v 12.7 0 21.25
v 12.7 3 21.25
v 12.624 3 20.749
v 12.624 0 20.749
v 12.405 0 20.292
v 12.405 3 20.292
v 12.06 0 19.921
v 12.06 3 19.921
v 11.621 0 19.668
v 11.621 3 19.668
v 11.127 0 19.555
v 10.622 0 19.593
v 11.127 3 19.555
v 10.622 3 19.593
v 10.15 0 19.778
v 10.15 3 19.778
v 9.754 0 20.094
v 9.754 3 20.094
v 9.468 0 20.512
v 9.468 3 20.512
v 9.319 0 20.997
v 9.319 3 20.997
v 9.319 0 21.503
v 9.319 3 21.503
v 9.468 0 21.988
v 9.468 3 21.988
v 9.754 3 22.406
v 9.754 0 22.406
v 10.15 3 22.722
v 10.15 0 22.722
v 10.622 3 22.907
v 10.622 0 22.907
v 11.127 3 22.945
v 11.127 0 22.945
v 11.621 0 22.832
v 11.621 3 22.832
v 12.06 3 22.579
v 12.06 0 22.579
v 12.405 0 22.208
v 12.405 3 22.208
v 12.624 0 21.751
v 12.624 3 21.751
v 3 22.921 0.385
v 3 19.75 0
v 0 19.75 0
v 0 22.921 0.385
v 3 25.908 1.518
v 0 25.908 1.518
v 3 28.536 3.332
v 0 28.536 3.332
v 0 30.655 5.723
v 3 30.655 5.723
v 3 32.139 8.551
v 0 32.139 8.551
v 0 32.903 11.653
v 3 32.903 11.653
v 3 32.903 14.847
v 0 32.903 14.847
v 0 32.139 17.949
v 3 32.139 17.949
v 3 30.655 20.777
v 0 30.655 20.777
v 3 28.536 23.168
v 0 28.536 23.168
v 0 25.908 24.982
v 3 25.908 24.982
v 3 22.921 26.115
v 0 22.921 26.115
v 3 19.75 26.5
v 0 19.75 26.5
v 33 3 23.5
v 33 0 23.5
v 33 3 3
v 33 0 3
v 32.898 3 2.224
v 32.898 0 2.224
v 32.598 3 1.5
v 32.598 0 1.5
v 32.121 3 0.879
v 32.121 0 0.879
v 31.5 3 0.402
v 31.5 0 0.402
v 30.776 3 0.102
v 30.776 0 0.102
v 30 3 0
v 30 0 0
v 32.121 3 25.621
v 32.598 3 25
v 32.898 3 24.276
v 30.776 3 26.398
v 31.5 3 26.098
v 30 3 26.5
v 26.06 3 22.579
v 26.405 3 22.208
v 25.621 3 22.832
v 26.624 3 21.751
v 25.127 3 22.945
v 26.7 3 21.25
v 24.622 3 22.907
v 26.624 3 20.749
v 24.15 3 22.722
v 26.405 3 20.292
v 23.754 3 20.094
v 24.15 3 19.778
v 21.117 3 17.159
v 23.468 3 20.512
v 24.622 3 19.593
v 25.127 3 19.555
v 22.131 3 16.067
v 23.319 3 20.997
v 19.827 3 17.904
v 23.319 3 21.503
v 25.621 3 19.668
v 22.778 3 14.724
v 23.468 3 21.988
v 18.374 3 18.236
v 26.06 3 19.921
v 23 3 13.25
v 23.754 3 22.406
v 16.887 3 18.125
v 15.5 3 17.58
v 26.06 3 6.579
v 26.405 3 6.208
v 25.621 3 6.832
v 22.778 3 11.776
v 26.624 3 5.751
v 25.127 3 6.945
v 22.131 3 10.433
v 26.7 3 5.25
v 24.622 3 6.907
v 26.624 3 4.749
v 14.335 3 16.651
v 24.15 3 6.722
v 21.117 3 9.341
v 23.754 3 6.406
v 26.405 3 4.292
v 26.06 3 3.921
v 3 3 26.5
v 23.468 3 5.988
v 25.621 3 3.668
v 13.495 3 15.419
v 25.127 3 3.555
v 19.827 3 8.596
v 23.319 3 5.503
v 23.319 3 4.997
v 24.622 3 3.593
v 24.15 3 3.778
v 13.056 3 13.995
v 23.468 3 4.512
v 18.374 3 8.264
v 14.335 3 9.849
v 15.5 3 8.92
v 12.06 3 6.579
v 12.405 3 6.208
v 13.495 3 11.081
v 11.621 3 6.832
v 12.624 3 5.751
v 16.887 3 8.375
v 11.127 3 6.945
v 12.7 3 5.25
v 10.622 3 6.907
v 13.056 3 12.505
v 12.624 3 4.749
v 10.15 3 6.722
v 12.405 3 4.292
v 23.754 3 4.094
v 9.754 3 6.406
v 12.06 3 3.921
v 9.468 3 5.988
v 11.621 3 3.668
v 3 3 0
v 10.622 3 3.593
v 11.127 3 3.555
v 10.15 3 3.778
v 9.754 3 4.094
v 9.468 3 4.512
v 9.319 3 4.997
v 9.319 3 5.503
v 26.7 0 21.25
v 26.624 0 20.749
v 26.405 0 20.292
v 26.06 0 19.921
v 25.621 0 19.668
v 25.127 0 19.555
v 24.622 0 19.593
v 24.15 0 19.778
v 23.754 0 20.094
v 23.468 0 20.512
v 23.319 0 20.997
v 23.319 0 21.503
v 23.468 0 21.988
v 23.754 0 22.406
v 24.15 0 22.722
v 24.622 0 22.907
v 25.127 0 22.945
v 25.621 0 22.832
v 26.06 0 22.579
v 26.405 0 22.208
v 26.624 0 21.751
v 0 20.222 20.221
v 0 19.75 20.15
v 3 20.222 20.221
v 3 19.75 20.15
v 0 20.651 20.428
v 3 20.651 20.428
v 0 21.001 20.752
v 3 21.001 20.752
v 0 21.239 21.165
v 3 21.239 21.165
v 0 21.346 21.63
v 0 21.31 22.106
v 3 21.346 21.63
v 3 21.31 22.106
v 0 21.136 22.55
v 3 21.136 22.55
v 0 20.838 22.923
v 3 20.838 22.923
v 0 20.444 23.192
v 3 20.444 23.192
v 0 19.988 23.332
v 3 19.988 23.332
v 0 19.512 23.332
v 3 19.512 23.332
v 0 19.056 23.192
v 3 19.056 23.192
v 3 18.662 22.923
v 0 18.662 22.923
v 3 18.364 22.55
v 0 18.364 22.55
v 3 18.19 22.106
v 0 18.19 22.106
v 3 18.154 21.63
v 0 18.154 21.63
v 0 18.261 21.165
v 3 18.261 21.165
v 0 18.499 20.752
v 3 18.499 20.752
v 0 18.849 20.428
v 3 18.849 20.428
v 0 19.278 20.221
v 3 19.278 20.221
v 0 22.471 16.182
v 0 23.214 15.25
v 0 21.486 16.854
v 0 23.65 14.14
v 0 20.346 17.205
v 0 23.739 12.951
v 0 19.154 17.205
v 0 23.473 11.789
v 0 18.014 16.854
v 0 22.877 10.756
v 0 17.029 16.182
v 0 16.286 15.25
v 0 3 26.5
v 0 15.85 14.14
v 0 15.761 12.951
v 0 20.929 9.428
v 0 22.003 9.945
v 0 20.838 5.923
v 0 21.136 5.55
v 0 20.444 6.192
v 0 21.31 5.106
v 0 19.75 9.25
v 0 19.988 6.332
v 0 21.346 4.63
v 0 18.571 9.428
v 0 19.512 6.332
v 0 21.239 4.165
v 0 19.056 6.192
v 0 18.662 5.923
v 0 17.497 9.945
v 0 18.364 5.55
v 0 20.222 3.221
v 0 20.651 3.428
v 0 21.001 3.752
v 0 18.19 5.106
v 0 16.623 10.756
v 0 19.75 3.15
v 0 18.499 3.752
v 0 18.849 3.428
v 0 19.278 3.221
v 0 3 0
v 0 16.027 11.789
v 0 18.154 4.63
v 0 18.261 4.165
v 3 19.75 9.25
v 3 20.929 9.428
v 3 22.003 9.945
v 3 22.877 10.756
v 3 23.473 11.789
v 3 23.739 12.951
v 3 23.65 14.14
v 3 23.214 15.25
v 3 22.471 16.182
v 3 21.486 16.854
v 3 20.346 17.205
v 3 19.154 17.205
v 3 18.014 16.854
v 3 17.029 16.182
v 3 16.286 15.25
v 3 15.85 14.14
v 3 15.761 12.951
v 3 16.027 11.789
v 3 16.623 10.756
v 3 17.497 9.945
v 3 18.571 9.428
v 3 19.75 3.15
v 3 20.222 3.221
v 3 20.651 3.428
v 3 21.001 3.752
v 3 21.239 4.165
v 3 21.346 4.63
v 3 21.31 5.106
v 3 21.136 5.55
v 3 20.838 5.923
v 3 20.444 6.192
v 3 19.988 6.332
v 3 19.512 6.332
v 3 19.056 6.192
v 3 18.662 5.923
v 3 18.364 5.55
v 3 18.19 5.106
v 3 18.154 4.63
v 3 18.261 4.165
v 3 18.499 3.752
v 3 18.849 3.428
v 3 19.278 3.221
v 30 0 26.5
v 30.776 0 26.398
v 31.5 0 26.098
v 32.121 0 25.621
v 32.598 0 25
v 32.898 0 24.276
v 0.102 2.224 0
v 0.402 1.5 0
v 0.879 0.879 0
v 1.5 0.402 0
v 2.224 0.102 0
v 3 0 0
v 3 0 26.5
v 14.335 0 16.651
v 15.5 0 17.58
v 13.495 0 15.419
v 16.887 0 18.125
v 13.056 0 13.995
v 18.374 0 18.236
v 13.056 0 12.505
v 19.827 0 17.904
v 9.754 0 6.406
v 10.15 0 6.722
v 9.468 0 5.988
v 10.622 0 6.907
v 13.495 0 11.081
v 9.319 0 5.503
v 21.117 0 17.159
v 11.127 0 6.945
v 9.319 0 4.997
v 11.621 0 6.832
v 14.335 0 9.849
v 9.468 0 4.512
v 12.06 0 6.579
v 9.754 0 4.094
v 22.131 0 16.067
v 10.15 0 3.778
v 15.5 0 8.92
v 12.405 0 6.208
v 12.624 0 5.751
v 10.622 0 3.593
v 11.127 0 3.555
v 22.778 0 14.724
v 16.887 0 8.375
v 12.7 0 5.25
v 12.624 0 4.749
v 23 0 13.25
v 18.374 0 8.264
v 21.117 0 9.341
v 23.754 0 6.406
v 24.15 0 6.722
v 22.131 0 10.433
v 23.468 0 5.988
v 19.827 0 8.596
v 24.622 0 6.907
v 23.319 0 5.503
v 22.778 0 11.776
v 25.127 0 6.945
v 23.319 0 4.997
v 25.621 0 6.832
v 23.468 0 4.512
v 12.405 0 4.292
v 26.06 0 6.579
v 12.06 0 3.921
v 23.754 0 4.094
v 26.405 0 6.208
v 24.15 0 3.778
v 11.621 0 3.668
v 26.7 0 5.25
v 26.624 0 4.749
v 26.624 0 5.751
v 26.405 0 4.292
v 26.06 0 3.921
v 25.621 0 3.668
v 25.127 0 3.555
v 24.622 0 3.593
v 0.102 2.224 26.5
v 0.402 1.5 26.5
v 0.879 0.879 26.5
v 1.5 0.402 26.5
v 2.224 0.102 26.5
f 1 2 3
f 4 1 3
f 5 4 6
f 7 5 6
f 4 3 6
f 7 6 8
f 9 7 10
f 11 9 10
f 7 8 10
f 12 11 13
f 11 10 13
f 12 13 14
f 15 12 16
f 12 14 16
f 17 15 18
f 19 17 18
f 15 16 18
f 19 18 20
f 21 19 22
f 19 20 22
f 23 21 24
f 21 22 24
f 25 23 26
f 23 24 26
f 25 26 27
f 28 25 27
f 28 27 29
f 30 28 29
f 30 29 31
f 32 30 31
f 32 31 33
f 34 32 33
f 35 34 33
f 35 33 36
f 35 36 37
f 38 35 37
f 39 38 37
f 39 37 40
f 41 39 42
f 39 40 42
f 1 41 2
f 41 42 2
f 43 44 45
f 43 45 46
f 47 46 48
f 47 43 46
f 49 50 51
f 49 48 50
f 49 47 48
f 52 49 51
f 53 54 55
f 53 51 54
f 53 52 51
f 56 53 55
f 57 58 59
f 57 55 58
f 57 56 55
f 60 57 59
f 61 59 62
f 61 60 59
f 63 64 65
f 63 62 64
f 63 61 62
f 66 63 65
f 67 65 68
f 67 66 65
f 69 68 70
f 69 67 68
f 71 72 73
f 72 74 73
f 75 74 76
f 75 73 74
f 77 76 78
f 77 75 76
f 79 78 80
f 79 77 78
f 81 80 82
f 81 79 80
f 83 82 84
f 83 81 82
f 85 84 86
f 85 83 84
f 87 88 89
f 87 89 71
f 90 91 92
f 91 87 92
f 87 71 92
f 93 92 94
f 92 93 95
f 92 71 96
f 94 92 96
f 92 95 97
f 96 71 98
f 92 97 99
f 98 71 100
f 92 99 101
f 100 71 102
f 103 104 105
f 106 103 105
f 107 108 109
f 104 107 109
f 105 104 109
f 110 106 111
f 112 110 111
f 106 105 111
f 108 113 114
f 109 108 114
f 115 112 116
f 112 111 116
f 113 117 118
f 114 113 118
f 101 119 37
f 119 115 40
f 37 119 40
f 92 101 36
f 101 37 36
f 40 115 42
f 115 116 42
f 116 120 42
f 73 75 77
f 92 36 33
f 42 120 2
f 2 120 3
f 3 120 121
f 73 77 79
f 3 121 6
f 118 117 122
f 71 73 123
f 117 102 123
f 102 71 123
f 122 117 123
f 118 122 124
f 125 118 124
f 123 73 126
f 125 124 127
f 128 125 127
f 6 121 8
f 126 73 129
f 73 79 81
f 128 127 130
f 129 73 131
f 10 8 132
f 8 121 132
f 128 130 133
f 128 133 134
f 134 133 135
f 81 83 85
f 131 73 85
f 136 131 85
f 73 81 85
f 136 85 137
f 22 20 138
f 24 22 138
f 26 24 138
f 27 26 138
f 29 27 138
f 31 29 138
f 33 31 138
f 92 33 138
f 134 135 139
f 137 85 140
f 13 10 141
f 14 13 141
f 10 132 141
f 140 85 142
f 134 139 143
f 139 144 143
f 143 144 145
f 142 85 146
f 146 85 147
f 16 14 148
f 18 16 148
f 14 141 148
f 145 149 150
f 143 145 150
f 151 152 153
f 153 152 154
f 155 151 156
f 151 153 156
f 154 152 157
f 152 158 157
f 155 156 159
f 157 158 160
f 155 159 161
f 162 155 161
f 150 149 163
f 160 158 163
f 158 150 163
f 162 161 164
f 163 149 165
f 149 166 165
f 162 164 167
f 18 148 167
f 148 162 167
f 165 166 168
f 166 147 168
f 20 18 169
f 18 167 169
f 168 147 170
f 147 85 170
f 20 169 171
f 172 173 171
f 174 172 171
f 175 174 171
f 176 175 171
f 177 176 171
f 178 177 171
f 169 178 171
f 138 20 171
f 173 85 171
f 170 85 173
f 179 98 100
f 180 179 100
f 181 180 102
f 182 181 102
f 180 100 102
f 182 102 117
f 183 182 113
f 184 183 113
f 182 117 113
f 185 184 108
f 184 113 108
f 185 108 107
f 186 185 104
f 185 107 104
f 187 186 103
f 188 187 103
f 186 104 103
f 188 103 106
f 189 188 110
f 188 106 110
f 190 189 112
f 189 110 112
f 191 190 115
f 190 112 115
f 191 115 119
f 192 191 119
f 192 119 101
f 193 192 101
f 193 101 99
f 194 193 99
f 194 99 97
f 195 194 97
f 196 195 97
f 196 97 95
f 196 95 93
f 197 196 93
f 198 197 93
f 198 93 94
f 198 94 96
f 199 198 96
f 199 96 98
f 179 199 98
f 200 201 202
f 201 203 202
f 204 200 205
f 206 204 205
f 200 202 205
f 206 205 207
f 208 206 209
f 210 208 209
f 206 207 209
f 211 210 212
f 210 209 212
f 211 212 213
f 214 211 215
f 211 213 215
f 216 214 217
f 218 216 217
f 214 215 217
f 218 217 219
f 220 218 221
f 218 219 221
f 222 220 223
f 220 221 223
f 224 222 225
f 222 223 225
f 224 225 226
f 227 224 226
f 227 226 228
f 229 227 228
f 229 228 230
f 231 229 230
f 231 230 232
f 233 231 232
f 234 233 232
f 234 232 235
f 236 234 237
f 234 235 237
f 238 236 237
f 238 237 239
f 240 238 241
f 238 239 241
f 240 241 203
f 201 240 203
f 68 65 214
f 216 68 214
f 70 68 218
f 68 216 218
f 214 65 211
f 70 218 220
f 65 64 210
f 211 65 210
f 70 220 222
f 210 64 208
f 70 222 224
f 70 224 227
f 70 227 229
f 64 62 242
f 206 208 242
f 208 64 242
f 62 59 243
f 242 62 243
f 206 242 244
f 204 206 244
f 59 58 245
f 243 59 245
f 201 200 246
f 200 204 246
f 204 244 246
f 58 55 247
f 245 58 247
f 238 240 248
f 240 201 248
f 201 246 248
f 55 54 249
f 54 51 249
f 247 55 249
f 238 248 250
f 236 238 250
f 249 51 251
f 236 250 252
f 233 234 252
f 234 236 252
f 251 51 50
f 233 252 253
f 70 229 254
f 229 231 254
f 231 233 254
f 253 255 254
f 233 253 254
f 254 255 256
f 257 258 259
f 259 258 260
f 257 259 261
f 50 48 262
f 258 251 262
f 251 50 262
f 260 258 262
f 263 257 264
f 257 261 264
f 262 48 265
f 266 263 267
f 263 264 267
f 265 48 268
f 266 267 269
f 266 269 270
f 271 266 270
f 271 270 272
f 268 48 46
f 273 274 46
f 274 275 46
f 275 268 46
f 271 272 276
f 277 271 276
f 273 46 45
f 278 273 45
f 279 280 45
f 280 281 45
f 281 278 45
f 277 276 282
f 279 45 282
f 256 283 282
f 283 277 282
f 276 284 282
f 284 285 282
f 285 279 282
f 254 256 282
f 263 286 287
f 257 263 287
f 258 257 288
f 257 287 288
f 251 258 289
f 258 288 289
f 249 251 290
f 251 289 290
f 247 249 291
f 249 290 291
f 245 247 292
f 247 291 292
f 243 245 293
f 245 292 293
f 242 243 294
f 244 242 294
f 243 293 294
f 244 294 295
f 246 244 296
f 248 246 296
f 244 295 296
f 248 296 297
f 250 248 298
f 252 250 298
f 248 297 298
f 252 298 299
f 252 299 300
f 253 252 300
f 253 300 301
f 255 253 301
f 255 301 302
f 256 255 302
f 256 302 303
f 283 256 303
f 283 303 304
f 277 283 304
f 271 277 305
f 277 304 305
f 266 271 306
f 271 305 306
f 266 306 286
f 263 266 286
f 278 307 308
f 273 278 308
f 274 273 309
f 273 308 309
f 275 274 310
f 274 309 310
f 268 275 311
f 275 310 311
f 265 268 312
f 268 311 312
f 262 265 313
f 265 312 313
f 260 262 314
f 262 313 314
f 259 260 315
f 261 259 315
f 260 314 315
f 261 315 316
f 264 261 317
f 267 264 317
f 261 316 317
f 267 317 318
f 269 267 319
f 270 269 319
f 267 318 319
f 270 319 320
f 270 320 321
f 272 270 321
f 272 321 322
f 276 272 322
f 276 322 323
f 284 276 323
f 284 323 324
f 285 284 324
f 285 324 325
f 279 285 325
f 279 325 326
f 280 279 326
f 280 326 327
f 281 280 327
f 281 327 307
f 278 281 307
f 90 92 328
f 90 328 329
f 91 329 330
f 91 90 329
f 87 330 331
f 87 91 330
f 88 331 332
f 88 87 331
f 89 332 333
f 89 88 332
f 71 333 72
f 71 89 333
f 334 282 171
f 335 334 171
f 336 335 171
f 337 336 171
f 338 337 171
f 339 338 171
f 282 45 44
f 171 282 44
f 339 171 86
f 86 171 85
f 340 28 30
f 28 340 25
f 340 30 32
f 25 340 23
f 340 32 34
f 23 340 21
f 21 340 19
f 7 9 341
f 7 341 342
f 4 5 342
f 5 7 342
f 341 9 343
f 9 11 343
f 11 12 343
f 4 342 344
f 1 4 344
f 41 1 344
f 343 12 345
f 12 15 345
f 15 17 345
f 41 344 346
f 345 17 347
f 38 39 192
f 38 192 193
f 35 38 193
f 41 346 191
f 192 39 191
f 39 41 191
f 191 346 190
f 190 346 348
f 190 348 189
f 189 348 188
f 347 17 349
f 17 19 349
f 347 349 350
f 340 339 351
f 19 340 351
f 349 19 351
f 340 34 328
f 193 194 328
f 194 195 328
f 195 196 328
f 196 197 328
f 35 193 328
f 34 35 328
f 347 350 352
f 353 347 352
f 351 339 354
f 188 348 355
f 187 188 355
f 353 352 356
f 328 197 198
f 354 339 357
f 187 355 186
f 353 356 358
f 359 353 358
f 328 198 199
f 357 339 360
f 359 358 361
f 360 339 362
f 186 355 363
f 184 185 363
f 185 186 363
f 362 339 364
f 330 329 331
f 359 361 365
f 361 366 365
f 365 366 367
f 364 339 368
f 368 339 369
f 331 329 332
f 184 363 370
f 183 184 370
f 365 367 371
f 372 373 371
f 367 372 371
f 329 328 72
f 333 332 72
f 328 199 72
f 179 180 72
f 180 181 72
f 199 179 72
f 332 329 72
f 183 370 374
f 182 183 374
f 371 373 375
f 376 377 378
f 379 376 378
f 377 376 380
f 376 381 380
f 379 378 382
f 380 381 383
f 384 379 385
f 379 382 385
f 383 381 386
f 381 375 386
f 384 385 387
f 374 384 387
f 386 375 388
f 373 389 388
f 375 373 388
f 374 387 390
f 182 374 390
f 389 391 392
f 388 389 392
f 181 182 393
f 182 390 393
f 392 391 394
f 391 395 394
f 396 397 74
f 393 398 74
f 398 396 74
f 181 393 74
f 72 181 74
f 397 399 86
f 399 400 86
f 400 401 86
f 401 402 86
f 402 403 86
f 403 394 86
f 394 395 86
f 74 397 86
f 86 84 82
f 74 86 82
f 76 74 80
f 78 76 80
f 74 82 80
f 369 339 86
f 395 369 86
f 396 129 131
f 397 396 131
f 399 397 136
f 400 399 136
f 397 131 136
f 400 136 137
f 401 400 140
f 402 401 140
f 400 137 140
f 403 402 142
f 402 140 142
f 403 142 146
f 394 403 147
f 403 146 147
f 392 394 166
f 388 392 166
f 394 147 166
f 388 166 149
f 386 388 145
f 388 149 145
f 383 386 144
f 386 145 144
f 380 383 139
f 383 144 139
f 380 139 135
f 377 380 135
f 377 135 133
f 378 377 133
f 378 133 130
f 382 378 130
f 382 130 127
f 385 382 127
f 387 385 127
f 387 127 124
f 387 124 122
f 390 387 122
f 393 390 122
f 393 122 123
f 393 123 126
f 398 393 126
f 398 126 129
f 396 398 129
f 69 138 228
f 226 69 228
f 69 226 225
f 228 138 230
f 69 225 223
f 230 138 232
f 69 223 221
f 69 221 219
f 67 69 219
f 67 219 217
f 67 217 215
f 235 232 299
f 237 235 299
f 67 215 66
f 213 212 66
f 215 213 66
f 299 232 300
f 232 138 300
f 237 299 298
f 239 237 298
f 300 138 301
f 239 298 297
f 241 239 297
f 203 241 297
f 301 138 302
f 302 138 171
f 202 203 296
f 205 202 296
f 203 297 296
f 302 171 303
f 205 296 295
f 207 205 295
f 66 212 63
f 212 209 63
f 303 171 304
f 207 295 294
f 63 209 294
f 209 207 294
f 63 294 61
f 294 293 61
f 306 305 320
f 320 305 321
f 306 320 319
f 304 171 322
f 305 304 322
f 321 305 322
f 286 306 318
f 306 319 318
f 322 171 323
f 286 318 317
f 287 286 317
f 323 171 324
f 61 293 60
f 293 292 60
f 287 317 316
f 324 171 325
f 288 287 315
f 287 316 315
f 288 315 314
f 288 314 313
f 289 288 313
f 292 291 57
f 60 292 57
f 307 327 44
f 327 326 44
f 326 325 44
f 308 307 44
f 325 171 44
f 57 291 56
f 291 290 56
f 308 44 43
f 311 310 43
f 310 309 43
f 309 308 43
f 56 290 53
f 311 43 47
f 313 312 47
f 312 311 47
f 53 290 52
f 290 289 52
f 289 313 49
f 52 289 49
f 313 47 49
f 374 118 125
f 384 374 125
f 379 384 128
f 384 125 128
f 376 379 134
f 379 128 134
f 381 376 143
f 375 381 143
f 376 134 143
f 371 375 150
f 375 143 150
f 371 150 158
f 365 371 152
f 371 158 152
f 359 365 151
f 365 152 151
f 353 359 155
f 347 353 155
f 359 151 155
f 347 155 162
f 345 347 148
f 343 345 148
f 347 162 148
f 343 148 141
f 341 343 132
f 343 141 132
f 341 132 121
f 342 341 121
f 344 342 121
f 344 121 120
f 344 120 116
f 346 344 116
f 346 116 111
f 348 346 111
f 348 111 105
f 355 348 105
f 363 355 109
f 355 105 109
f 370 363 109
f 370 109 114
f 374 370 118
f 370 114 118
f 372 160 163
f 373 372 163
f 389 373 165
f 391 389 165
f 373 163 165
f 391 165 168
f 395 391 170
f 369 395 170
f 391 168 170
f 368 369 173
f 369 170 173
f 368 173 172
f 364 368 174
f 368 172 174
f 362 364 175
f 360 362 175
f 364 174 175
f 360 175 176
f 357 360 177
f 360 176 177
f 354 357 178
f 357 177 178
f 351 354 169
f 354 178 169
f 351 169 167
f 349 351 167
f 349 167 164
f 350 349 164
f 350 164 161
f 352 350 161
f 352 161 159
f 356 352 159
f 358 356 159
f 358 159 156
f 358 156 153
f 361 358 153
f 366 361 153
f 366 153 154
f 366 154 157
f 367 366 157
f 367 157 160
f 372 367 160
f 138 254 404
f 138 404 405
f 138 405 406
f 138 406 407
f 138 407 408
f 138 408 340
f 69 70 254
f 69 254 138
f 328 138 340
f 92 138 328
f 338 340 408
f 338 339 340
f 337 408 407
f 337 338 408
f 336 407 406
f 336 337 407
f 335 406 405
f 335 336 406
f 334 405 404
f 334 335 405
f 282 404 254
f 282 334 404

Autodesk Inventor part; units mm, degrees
ref_plane "YZ Plane" through (0, 0, 0) normal (1, 0, 0) x (0, 1, 0)
ref_plane "XZ Plane" through (0, 0, 0) normal (0, 1, 0) x (-1, 0, 0)
ref_plane "XY Plane" through (0, 0, 0) normal (0, 0, 1) x (1, 0, 0)
sketch "Sketch1" plane through (0, 0, 0) normal (0, 0, 1) x (1, 0, 0)
  line L0 (3, 0) -> (33, 0)
  line L1 (33, 0) -> (33, 3)
  line L2 (33, 3) -> (3, 3)
  line L3 (3, 3) -> (3, 33)
  line L4 (3, 33) -> (0, 33)
  line L5 (0, 33) -> (0, 3)
  arc A0 (0, 3) -> (3, 0) centre (3, 3) ccw
  point P0 (0, 0)
extrude "Extrusion1" add sketch "Sketch1" along normal blind 26.5
sketch "Sketch2" plane through (3, 3, 0) normal (1, 0, 0) x (0, 0, -1)
  line L0 (0, 30) -> (-26.5, 30) projected
  circle A0 centre (-13.25, 16.75) radius 13.25
  line L1 (0, 0) -> (0, 30) projected
  circle A1 centre (-13.25, 16.75) radius 4
  line L2 (-21.75, 16.75) -> (-4.75, 16.75)
  circle A2 centre (-4.75, 16.75) radius 1.6
  circle A3 centre (-21.75, 16.75) radius 1.6
  line L3 (-26.5, 0) -> (-26.5, 30) projected
  point P0 (0, -3)
  point P1 (-26.5, 16.75)
  point P2 (-13.25, 30)
  point P3 (0, 16.75)
  dimension "d9" = 3.2
  dimension "d10" = 3.2
extrude "Extrusion2" cut sketch "Sketch2" against normal up to surface (3 mm away) contours L1 A0 L0 | A0 L3 L0 | L2 A1 | A3 | A1 L2 | A2
sketch "Sketch3" plane through (3, 3, 0) normal (0, 1, 0) x (1, 0, 0)
  line L0 (30, 0) -> (30, -26.5) projected
  line L1 (30, 0) -> (0, 0) projected
  line L2 (30, -26.5) -> (0, -26.5) projected
  line L3 (30, 0) -> (27, 0)
  arc A0 (30, -3) -> (27, 0) centre (27, -3) ccw
  arc A1 (27, -26.5) -> (30, -23.5) centre (27, -23.5) ccw
  circle A2 centre (15, -13.25) radius 5
  circle A3 centre (22, -5.25) radius 1.7
  circle A4 centre (8, -5.25) radius 1.7
  circle A5 centre (22, -21.25) radius 1.7
  circle A6 centre (8, -21.25) radius 1.7
  point P0 (-3, 0)
  point P1 (30, -23.5)
extrude "Extrusion3" cut sketch "Sketch3" against normal up to surface (3 mm away)
properties part number "do_ga"
